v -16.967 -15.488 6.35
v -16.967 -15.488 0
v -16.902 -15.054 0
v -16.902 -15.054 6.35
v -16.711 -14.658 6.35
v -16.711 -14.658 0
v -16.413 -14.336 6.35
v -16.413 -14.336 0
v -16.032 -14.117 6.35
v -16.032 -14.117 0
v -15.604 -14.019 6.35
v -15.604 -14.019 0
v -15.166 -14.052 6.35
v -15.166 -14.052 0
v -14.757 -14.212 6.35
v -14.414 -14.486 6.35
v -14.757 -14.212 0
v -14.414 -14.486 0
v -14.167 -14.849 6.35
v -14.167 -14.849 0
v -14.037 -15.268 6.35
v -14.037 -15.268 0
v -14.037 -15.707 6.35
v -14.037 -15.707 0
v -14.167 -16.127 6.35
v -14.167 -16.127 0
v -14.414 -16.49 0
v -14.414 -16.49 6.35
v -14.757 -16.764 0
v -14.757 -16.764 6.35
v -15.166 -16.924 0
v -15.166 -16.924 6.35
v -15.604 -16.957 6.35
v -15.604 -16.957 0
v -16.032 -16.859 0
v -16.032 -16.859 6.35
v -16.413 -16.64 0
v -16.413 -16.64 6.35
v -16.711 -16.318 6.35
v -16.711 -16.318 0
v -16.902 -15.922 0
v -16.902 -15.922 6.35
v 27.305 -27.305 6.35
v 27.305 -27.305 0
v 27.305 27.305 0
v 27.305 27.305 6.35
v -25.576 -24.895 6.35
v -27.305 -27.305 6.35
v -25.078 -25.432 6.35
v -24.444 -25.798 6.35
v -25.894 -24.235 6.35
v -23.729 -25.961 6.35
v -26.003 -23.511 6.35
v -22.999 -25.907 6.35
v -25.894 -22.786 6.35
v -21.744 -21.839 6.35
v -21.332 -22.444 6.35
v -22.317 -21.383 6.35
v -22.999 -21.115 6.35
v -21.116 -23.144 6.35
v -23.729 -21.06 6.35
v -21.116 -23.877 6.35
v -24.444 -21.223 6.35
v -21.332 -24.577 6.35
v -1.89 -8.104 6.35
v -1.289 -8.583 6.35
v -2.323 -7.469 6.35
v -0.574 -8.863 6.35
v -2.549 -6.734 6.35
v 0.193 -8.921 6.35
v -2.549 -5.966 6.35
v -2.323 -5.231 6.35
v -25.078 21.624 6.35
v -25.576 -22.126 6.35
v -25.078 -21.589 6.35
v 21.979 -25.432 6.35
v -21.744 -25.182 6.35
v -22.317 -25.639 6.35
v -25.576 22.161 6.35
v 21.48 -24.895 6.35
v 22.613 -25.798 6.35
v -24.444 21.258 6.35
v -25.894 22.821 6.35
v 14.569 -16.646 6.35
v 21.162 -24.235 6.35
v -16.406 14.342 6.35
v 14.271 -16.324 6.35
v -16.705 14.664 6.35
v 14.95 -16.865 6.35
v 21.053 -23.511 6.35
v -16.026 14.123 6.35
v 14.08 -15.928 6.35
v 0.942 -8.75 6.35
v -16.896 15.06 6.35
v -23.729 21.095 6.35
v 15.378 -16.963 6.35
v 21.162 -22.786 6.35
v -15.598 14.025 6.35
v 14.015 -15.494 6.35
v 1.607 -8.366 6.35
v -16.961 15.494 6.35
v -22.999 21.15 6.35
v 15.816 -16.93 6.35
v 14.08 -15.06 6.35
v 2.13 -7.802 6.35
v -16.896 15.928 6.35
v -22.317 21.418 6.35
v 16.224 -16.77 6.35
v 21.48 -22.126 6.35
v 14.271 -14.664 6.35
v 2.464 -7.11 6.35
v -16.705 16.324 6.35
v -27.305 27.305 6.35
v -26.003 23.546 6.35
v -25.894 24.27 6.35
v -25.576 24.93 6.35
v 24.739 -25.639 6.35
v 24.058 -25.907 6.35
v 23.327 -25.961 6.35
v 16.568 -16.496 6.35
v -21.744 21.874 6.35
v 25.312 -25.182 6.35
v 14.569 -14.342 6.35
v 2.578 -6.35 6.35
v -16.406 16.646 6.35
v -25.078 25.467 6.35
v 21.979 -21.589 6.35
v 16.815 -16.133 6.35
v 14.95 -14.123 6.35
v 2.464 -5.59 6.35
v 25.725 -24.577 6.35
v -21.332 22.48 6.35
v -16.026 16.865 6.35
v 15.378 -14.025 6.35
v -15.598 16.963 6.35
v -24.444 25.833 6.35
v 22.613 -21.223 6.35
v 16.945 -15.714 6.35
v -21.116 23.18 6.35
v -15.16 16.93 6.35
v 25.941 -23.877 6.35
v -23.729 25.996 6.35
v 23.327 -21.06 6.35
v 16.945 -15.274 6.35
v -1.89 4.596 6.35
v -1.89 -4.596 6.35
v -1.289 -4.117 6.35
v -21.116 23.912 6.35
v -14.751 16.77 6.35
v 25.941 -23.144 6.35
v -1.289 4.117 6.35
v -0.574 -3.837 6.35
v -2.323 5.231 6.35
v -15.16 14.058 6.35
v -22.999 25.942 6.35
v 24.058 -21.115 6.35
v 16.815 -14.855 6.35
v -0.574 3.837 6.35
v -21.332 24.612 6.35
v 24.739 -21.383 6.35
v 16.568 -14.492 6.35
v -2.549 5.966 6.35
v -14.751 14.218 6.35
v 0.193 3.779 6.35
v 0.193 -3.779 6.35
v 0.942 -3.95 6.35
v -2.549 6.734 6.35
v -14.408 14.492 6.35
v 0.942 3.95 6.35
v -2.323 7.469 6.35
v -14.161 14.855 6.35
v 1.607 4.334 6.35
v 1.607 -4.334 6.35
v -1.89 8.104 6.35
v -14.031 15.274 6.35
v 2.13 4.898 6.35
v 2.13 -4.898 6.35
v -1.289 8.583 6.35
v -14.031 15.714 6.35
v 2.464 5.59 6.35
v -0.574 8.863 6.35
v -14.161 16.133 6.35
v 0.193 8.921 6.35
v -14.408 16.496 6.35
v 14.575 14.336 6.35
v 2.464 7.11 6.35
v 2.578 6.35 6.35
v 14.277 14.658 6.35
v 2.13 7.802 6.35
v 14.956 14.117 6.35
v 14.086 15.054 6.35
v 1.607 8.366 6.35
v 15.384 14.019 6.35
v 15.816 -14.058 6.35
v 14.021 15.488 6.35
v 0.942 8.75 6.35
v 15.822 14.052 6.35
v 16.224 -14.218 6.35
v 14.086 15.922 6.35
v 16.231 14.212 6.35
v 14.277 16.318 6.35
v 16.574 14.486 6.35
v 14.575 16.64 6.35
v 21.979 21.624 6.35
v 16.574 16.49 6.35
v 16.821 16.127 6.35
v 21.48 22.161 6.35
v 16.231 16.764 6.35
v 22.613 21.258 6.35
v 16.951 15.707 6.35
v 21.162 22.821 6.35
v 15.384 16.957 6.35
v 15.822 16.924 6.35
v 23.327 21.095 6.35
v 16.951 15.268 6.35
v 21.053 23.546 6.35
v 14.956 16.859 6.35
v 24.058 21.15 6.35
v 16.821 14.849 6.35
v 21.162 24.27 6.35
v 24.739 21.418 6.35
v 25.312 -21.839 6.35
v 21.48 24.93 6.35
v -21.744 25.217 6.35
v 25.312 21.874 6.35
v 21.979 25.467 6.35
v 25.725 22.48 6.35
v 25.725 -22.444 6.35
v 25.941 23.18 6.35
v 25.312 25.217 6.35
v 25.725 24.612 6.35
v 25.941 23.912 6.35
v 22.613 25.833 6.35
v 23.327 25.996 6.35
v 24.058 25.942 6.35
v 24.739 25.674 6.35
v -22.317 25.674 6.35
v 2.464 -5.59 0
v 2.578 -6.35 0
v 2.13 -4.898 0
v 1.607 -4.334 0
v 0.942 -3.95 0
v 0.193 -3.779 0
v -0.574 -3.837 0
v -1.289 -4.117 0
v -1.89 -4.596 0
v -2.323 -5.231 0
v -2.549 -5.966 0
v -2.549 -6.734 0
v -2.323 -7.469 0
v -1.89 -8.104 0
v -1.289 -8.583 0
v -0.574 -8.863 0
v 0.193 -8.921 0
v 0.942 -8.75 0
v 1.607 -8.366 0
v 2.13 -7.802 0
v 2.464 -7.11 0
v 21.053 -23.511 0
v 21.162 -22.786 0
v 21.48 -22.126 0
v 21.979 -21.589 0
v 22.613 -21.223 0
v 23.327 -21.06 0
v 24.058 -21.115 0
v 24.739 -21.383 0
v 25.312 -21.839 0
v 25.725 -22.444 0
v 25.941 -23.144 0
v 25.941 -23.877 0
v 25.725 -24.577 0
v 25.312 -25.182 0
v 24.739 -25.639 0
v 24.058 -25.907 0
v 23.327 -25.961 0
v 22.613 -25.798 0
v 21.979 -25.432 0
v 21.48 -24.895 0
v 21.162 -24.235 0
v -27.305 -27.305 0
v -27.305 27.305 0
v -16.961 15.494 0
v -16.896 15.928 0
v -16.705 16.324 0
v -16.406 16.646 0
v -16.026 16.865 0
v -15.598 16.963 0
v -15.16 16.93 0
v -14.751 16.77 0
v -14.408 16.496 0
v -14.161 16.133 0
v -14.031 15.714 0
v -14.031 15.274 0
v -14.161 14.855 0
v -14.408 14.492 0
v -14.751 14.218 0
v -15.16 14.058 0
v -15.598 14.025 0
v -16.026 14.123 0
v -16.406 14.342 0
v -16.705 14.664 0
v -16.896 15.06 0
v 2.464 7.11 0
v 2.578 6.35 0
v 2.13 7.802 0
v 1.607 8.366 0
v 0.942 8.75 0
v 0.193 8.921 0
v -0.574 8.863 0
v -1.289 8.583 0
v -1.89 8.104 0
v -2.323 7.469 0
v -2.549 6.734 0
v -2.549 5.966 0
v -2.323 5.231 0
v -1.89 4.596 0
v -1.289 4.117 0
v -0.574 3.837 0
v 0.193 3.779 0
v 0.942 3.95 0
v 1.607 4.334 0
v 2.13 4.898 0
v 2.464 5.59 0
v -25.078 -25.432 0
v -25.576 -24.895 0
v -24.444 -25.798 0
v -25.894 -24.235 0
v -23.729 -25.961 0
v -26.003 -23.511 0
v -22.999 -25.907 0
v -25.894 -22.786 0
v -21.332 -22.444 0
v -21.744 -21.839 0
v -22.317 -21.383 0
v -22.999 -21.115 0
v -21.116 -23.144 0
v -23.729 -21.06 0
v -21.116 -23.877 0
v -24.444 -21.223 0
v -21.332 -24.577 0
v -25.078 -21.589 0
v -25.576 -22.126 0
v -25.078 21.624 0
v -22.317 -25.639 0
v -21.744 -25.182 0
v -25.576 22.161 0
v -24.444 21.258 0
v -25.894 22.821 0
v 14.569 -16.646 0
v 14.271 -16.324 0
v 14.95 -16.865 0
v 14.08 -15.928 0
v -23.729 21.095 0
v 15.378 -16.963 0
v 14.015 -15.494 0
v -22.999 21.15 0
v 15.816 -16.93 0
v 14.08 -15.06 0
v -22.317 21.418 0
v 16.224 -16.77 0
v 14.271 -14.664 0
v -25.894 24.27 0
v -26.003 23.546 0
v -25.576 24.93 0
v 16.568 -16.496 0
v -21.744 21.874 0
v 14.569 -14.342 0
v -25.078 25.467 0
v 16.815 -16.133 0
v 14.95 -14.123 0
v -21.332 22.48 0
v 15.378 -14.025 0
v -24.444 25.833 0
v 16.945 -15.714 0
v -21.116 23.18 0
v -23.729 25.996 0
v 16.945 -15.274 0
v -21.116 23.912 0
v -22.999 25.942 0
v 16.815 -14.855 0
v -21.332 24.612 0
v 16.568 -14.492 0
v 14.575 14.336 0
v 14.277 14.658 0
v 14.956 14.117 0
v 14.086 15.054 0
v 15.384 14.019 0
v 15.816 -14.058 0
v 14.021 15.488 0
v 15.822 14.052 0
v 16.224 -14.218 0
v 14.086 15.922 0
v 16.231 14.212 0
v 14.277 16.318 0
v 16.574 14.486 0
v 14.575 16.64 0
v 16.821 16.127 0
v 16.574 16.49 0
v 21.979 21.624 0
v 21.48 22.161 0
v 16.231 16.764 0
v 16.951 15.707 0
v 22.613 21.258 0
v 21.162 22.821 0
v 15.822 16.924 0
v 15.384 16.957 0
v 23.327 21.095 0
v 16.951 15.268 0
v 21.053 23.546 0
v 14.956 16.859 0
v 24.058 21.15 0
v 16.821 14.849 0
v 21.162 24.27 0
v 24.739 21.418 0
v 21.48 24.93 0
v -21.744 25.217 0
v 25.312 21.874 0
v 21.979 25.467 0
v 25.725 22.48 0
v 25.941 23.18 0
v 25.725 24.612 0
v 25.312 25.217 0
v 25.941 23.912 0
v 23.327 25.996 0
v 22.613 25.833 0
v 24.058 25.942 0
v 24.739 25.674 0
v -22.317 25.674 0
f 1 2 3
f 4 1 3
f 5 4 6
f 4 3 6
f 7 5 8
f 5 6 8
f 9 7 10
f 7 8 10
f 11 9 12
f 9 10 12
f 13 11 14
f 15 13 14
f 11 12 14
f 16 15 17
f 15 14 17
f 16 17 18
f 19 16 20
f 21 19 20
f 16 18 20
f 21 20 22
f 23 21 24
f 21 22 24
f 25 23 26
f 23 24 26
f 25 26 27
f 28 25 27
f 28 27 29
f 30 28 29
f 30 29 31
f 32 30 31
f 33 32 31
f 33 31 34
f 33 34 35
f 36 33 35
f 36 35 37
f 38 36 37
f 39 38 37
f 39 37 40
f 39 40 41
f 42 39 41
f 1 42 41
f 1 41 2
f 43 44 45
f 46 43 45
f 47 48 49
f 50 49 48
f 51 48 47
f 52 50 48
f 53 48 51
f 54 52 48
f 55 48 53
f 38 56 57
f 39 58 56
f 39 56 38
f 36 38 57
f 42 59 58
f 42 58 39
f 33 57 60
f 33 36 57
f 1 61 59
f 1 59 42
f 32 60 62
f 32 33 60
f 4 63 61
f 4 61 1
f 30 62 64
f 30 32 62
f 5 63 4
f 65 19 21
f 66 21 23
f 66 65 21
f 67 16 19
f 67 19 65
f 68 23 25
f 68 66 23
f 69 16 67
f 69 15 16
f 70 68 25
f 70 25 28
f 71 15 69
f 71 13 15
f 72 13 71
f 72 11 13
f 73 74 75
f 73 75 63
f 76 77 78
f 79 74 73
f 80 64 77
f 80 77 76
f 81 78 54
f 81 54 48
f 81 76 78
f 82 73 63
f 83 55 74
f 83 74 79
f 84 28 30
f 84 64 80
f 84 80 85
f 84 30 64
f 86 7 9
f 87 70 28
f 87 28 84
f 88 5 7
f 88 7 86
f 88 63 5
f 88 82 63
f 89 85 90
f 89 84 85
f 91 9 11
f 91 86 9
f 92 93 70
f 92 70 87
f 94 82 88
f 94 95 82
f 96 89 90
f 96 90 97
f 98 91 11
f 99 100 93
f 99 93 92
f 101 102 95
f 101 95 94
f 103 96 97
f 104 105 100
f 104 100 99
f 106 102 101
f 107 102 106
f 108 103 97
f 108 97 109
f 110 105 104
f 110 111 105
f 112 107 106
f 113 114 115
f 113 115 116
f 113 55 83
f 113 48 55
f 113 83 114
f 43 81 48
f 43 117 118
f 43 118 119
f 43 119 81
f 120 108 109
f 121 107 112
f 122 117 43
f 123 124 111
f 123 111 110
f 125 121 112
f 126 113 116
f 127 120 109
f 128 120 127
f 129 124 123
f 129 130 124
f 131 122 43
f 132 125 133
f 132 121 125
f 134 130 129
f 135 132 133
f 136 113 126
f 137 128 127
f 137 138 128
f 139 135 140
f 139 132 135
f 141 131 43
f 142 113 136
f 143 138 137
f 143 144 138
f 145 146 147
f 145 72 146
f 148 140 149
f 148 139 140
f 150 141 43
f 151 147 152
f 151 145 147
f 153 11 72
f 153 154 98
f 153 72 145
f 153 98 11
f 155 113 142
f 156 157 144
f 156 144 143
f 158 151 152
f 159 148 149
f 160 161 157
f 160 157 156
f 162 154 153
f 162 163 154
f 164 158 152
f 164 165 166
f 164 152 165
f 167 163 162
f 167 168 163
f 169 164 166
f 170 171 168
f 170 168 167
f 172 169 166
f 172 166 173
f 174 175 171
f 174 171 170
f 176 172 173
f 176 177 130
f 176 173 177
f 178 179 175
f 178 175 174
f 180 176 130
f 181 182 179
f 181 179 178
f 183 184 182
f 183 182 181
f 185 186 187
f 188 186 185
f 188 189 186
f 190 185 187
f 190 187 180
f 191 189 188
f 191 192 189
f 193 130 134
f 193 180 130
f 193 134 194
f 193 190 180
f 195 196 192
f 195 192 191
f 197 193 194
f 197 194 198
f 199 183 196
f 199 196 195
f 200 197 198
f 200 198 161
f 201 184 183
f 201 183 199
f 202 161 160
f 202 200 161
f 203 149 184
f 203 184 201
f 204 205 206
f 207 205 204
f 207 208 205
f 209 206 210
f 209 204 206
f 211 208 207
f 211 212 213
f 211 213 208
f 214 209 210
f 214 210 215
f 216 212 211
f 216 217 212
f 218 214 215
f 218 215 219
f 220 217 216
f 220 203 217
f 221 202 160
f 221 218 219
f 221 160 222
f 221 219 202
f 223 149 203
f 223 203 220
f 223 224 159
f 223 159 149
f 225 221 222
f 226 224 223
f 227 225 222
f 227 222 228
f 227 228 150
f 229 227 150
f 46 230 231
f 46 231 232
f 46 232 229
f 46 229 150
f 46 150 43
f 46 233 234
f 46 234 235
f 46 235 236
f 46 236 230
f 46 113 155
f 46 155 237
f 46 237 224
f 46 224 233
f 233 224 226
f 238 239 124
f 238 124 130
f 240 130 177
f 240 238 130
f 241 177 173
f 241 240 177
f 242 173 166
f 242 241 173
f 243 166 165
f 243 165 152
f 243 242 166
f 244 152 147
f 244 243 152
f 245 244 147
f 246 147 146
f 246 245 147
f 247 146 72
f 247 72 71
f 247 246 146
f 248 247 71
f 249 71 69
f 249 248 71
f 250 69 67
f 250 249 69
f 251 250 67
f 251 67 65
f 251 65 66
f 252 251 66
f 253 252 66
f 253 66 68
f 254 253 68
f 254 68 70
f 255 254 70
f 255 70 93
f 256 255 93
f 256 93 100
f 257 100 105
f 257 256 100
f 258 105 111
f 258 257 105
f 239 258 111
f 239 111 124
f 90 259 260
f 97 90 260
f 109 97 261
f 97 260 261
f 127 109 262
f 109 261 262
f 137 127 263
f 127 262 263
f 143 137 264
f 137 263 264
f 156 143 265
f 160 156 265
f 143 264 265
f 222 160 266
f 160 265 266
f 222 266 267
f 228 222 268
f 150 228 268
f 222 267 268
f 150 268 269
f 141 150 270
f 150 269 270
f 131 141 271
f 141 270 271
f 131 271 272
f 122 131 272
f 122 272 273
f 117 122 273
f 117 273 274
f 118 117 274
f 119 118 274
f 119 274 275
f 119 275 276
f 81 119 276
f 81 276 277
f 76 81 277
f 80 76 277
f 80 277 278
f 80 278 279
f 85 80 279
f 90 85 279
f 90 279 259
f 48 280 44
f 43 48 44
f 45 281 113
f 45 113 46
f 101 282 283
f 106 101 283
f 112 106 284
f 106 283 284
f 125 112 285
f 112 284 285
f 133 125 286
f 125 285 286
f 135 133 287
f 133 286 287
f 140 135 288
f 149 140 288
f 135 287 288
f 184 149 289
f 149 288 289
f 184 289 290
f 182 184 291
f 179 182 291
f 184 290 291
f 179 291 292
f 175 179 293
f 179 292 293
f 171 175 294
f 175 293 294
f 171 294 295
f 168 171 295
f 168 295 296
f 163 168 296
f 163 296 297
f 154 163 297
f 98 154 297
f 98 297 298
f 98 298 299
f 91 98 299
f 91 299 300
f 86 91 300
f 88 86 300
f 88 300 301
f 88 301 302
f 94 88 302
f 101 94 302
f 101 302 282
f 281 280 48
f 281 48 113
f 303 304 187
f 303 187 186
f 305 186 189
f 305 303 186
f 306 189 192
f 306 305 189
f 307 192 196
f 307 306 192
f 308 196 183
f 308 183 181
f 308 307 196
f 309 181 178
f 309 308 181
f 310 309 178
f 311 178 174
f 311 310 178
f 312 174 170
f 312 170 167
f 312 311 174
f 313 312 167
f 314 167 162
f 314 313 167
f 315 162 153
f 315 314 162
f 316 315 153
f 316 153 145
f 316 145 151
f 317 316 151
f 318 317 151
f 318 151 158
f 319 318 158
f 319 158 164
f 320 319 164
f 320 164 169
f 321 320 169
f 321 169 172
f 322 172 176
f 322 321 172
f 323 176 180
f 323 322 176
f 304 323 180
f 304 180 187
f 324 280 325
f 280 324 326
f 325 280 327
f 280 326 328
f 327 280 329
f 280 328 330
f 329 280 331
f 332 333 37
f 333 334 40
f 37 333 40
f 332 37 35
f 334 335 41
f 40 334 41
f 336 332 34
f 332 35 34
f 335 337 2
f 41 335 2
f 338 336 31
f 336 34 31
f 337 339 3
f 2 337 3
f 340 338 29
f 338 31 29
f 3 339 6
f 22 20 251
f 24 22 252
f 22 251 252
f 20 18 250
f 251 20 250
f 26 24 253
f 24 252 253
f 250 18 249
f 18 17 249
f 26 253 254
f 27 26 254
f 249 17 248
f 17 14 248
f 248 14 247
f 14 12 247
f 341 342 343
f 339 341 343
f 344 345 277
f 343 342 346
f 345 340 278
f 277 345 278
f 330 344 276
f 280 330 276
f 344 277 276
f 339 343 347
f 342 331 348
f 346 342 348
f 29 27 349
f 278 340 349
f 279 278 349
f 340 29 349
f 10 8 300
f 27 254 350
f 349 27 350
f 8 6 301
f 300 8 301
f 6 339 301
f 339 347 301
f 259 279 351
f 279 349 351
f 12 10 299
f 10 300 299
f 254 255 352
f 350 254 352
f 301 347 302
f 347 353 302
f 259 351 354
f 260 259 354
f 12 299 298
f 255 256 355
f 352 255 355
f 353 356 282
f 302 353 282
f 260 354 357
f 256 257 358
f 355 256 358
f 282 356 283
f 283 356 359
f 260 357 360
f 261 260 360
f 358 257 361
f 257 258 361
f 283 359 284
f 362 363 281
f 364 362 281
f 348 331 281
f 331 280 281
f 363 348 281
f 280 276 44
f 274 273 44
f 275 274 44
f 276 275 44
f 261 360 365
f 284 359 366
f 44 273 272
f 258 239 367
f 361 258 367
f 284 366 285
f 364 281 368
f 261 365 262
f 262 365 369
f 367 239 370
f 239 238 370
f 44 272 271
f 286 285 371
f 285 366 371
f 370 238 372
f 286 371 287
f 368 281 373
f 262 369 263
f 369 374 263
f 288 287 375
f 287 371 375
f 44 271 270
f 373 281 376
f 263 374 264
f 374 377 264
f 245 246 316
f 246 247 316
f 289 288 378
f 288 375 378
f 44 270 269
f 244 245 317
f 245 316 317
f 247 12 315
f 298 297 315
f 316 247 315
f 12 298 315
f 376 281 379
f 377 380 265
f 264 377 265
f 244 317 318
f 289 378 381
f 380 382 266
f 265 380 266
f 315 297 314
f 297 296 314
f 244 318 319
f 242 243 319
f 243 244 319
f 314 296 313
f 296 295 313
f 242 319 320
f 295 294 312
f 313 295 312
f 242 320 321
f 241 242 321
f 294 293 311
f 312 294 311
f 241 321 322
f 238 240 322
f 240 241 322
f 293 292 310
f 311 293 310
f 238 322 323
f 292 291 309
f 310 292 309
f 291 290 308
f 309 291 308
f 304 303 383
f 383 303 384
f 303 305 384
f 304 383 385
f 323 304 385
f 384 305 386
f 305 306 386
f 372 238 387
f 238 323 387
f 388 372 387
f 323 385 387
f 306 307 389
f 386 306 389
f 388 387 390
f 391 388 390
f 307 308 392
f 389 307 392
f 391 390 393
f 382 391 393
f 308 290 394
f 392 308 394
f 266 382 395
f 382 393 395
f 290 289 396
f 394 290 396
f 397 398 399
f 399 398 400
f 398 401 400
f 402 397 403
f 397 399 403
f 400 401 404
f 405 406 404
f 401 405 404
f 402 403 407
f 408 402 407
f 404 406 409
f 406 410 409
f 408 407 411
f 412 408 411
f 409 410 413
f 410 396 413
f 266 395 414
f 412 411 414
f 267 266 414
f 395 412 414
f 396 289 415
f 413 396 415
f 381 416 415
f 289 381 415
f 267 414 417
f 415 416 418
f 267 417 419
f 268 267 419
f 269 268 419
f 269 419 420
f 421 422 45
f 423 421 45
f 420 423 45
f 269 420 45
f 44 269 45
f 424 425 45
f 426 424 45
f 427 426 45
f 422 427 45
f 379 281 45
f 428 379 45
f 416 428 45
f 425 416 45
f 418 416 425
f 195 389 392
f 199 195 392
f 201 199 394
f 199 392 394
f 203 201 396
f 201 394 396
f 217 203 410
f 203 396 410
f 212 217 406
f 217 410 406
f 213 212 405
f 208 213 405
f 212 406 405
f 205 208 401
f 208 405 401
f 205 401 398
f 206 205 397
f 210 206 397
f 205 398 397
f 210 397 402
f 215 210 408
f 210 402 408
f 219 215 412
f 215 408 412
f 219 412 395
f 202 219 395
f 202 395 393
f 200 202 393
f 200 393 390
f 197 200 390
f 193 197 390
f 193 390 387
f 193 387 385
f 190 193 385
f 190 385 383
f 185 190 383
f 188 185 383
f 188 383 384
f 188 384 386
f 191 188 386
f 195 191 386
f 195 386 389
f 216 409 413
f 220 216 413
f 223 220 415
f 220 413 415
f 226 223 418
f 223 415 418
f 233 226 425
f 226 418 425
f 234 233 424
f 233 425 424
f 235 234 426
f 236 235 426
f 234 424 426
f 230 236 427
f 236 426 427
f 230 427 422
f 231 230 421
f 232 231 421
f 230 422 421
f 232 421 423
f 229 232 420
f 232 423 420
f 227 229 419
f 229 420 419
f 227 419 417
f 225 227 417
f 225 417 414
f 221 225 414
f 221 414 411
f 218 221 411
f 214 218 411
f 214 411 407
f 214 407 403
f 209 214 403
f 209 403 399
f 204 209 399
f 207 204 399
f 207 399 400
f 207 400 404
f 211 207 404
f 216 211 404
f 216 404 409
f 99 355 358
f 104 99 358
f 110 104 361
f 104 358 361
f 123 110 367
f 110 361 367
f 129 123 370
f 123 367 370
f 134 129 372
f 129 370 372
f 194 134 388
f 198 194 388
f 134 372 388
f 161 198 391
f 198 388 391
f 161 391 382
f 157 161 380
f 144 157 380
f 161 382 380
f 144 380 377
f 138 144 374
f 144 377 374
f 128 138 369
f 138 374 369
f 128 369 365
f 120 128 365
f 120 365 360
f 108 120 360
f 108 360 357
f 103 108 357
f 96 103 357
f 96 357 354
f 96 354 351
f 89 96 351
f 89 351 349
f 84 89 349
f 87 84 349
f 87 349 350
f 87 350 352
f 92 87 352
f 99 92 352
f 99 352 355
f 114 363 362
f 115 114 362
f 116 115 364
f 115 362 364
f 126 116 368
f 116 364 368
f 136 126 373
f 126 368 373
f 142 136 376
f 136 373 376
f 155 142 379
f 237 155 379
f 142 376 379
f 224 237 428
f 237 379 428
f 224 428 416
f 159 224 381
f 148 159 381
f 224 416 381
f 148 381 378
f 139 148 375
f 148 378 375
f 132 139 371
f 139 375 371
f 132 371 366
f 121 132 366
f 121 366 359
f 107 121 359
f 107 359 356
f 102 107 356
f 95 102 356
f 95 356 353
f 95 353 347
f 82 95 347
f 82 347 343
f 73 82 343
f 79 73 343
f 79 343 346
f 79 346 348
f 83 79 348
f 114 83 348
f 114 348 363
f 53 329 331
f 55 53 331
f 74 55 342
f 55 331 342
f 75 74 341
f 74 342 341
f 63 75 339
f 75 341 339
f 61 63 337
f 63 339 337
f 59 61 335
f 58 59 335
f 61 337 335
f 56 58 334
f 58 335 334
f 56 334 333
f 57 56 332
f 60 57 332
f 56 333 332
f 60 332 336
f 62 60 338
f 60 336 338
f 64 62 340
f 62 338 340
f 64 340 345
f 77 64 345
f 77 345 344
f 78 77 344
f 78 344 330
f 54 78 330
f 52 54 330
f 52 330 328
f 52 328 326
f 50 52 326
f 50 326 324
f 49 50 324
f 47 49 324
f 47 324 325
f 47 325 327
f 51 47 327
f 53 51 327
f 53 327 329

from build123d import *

# Parameters (mm, degrees)
SKETCH1_W                    = 54.61
SKETCH1_H                    = 54.61
BOSS_EXTRUDE1_DEPTH          = 6.35
F_10_0_1935_DIAMETER_HOLE1_D = 4.9149
F_32_0_116_DIAMETER_HOLE1_D  = 2.9464
SKETCH10_R                   = 2.5781
CUT_EXTRUDE1_DEPTH           = 6.35


with BuildPart() as part:
    # Sketch1 → Boss-Extrude1 (new body)
    with BuildSketch(Plane.XY):
        Rectangle(SKETCH1_W, SKETCH1_H)
    extrude(amount=BOSS_EXTRUDE1_DEPTH)

    # #10 (0.1935) Diameter Hole1 (through all)
    with Locations(Plane.XY.offset(6.35)):
        with Locations((-23.5458, 23.5458), (23.510742074, 23.5458), (23.510742074, -23.510742074), (-23.5458, -23.510742074)):
            Hole(F_10_0_1935_DIAMETER_HOLE1_D / 2)

    # #32 (0.116) Diameter Hole1 (through all)
    with Locations(Plane.XY.offset(6.35)):
        with Locations((-15.487883014, 15.494), (15.494, 15.487883014), (15.487883014, -15.494), (-15.494, -15.487883014)):
            Hole(F_32_0_116_DIAMETER_HOLE1_D / 2)

    # Sketch10 → Cut-Extrude1 (cut)
    with BuildSketch(Plane.XY):
        with Locations((0, 6.35)):
            Circle(SKETCH10_R)
        with Locations((0, -6.35)):
            Circle(SKETCH10_R)
    extrude(amount=CUT_EXTRUDE1_DEPTH, mode=Mode.SUBTRACT)


solid = part.part
